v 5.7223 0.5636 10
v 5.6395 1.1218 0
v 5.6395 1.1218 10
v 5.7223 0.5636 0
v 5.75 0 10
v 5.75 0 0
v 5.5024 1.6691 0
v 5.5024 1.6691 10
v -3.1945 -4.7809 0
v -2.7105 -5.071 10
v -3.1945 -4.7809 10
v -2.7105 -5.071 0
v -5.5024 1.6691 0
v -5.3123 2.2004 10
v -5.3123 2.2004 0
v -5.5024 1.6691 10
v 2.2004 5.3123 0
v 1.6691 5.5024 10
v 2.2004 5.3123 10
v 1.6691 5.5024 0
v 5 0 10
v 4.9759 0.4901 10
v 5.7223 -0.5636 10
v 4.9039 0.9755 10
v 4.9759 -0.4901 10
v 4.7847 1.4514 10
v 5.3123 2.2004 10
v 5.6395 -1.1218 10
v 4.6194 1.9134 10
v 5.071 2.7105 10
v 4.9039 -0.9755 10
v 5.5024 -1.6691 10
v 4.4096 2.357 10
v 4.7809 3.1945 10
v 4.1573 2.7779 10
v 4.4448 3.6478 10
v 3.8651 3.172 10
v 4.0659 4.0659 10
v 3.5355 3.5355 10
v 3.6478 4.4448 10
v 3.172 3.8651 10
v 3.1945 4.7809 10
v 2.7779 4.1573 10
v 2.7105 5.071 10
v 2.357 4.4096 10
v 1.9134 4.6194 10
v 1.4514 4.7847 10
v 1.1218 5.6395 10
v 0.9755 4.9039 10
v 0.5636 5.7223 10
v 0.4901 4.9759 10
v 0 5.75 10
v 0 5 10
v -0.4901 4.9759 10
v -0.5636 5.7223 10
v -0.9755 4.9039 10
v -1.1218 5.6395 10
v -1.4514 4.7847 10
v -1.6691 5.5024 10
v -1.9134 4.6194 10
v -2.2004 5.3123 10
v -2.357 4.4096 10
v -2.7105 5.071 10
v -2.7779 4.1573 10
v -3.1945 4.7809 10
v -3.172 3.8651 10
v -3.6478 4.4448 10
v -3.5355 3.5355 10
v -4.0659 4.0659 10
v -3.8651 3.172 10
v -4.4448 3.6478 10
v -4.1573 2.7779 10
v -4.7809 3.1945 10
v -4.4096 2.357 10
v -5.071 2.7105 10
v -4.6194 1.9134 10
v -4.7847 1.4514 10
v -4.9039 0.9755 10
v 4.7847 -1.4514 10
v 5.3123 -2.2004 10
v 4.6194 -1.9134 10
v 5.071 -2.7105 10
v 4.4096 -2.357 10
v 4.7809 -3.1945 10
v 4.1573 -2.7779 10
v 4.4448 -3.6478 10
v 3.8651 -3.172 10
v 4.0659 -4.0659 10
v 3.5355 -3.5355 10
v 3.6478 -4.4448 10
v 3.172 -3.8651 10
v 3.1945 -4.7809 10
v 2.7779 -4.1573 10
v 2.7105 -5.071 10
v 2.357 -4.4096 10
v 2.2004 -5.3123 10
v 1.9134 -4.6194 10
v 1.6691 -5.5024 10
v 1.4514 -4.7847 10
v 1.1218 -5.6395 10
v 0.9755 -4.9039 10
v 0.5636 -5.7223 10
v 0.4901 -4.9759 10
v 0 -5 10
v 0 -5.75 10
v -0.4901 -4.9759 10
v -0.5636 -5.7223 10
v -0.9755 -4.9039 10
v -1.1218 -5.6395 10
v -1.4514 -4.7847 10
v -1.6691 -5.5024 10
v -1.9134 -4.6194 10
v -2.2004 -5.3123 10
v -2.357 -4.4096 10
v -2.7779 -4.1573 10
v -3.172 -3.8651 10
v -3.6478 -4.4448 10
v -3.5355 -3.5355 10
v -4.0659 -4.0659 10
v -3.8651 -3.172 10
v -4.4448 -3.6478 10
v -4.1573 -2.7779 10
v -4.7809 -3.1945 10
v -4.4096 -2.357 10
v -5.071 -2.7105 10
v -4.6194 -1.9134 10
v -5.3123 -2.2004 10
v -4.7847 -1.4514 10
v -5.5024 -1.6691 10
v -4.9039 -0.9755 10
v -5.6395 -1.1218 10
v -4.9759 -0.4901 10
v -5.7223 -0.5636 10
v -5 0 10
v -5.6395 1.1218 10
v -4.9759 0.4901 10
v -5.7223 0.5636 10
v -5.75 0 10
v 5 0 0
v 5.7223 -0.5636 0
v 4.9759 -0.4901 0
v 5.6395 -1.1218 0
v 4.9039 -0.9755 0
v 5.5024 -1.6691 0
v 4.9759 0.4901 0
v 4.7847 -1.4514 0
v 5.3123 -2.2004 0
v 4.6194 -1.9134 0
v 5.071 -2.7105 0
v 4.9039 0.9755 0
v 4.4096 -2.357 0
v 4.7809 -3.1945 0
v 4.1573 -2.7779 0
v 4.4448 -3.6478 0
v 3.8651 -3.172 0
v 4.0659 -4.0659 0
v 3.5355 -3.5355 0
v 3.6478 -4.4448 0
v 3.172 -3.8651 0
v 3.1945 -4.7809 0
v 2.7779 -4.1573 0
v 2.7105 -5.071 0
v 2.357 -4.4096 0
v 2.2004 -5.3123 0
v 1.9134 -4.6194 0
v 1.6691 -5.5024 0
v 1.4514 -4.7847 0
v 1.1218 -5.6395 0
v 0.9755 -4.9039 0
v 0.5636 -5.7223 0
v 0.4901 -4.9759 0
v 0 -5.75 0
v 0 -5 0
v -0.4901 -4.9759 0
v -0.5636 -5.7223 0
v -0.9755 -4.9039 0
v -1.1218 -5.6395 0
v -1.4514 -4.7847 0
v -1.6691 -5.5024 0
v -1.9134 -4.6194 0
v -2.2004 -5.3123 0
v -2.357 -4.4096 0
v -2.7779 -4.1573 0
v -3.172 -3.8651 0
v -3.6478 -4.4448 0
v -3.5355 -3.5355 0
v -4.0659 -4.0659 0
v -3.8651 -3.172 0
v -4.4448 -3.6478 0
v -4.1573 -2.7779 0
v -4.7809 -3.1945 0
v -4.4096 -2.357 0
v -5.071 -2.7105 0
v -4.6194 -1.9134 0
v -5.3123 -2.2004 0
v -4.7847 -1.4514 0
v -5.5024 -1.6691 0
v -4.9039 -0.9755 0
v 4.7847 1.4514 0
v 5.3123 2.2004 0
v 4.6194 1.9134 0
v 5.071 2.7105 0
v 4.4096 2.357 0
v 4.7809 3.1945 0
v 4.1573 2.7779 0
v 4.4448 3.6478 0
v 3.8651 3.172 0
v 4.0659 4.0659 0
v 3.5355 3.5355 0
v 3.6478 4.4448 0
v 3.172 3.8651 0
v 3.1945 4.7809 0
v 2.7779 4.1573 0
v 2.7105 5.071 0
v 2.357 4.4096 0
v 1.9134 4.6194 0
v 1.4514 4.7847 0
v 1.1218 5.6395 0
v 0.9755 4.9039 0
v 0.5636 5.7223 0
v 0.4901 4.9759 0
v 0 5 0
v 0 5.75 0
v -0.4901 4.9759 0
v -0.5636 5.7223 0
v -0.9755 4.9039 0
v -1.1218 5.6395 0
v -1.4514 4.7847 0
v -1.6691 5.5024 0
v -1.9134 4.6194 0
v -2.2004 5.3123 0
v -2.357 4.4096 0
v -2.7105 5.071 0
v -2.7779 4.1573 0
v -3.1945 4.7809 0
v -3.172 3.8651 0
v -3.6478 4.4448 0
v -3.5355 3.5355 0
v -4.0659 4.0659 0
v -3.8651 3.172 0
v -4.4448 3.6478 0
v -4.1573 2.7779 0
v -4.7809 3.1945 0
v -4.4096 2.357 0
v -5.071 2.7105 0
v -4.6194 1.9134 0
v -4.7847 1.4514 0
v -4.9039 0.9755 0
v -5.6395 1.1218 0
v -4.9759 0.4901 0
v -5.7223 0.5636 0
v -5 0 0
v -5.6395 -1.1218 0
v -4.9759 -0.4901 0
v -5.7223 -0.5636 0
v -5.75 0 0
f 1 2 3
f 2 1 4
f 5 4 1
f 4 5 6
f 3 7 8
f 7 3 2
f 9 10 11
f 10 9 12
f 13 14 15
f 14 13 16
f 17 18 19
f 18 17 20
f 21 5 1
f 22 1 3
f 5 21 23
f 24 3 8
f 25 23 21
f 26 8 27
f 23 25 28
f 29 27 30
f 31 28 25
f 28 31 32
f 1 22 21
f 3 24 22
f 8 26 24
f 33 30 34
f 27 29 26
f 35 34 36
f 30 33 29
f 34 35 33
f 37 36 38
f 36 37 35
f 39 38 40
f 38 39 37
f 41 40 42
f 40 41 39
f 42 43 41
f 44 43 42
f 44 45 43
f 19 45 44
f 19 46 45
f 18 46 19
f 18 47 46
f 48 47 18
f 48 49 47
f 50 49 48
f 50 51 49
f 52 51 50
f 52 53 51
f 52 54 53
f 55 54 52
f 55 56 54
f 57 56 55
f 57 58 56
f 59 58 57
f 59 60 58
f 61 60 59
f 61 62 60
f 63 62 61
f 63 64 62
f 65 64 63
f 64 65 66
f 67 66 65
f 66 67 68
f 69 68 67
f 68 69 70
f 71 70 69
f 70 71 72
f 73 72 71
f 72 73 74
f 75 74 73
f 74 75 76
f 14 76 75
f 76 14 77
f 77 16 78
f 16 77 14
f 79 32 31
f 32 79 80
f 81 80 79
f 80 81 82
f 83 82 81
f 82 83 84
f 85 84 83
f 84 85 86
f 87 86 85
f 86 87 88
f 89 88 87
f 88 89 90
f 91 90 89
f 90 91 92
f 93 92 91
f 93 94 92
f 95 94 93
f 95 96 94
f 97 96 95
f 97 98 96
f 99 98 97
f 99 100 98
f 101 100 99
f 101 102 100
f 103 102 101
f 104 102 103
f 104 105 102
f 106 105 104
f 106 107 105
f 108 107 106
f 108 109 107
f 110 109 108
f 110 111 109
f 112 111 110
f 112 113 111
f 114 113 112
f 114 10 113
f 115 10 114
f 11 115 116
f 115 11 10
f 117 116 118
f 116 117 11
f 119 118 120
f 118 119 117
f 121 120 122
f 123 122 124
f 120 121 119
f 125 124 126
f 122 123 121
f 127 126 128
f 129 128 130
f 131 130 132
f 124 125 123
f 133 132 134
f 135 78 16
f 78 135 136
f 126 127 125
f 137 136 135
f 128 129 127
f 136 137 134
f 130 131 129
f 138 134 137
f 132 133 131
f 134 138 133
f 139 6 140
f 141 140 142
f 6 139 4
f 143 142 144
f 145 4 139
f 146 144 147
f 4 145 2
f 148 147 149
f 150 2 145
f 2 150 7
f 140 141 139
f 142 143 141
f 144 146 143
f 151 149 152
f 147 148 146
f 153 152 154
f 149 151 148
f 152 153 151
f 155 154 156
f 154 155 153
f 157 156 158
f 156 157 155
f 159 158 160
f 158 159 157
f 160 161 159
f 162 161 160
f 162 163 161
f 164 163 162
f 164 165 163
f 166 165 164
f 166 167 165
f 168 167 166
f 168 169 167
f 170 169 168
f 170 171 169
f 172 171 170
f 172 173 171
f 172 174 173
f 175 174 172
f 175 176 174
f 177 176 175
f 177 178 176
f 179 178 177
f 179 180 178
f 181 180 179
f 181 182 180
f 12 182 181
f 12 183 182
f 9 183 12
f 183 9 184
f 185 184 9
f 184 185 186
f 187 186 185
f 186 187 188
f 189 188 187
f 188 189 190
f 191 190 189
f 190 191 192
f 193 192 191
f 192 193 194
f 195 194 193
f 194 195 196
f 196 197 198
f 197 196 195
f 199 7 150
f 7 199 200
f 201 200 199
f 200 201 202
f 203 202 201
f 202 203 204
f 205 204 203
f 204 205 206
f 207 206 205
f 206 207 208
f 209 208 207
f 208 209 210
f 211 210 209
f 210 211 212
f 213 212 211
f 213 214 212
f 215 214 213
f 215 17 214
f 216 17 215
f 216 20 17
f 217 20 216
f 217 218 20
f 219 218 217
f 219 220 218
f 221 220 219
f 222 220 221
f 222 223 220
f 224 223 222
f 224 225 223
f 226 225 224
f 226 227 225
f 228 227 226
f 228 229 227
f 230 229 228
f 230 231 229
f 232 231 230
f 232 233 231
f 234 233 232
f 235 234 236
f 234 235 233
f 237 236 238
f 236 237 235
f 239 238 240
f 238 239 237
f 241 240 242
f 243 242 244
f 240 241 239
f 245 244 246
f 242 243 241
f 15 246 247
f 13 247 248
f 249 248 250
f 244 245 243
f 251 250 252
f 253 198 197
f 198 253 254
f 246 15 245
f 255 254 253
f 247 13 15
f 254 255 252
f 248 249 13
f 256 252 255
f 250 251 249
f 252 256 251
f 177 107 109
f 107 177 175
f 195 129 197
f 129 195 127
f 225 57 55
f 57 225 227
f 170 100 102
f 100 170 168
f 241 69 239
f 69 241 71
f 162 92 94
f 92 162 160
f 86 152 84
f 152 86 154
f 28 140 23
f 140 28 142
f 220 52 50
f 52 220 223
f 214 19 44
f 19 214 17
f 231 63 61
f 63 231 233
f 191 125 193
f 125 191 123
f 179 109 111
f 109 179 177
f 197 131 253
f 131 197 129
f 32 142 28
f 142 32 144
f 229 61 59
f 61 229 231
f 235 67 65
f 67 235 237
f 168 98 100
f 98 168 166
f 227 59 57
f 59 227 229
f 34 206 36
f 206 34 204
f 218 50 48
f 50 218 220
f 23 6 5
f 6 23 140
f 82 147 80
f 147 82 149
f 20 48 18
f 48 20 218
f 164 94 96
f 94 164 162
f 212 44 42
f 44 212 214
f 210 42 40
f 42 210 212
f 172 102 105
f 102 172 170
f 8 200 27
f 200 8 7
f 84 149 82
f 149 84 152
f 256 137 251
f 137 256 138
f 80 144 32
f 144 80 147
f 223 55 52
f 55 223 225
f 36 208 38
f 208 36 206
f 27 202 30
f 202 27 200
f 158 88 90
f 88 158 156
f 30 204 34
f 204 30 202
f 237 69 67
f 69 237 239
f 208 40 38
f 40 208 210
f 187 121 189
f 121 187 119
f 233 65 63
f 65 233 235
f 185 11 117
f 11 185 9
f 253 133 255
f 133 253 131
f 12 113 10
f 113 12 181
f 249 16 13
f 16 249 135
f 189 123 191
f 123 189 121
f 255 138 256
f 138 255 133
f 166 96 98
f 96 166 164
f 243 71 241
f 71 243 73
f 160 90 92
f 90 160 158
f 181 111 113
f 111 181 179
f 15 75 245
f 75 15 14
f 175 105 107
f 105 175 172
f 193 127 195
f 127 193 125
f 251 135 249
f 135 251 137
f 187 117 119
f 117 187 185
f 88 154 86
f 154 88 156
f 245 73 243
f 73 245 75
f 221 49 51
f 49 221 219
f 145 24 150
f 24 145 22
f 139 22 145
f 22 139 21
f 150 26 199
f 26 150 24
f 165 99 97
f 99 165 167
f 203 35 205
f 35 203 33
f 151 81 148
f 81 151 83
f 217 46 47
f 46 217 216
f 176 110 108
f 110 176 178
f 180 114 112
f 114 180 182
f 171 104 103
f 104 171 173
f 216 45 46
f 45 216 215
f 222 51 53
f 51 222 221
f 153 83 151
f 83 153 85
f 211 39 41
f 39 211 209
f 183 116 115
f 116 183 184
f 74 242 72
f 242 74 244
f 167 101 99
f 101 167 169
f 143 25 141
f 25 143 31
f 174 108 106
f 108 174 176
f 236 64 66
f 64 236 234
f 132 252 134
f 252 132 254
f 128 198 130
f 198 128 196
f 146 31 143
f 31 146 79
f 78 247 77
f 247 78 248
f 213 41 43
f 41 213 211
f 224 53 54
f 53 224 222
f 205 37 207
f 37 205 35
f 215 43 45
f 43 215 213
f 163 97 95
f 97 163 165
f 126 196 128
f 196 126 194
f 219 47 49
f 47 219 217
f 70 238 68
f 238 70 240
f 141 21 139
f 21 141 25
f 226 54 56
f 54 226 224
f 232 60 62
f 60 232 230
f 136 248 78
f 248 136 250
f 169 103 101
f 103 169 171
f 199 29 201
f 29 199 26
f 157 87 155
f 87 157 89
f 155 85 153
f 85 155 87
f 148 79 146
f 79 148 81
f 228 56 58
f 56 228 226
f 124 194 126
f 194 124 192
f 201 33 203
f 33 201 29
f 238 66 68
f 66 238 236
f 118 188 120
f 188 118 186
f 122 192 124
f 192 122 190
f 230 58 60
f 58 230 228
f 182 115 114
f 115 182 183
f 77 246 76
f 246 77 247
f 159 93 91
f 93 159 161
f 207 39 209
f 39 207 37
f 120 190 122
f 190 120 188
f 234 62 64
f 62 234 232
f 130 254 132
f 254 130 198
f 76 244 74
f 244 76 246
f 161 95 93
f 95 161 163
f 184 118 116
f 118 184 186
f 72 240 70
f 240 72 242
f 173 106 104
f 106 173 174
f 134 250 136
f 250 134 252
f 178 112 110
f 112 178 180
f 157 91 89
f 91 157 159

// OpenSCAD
$fn=64;

difference() {
  cylinder(r=5.75,h=10);
  translate([0,0,-0.1]) cylinder(r=5,h=10.2);
}
